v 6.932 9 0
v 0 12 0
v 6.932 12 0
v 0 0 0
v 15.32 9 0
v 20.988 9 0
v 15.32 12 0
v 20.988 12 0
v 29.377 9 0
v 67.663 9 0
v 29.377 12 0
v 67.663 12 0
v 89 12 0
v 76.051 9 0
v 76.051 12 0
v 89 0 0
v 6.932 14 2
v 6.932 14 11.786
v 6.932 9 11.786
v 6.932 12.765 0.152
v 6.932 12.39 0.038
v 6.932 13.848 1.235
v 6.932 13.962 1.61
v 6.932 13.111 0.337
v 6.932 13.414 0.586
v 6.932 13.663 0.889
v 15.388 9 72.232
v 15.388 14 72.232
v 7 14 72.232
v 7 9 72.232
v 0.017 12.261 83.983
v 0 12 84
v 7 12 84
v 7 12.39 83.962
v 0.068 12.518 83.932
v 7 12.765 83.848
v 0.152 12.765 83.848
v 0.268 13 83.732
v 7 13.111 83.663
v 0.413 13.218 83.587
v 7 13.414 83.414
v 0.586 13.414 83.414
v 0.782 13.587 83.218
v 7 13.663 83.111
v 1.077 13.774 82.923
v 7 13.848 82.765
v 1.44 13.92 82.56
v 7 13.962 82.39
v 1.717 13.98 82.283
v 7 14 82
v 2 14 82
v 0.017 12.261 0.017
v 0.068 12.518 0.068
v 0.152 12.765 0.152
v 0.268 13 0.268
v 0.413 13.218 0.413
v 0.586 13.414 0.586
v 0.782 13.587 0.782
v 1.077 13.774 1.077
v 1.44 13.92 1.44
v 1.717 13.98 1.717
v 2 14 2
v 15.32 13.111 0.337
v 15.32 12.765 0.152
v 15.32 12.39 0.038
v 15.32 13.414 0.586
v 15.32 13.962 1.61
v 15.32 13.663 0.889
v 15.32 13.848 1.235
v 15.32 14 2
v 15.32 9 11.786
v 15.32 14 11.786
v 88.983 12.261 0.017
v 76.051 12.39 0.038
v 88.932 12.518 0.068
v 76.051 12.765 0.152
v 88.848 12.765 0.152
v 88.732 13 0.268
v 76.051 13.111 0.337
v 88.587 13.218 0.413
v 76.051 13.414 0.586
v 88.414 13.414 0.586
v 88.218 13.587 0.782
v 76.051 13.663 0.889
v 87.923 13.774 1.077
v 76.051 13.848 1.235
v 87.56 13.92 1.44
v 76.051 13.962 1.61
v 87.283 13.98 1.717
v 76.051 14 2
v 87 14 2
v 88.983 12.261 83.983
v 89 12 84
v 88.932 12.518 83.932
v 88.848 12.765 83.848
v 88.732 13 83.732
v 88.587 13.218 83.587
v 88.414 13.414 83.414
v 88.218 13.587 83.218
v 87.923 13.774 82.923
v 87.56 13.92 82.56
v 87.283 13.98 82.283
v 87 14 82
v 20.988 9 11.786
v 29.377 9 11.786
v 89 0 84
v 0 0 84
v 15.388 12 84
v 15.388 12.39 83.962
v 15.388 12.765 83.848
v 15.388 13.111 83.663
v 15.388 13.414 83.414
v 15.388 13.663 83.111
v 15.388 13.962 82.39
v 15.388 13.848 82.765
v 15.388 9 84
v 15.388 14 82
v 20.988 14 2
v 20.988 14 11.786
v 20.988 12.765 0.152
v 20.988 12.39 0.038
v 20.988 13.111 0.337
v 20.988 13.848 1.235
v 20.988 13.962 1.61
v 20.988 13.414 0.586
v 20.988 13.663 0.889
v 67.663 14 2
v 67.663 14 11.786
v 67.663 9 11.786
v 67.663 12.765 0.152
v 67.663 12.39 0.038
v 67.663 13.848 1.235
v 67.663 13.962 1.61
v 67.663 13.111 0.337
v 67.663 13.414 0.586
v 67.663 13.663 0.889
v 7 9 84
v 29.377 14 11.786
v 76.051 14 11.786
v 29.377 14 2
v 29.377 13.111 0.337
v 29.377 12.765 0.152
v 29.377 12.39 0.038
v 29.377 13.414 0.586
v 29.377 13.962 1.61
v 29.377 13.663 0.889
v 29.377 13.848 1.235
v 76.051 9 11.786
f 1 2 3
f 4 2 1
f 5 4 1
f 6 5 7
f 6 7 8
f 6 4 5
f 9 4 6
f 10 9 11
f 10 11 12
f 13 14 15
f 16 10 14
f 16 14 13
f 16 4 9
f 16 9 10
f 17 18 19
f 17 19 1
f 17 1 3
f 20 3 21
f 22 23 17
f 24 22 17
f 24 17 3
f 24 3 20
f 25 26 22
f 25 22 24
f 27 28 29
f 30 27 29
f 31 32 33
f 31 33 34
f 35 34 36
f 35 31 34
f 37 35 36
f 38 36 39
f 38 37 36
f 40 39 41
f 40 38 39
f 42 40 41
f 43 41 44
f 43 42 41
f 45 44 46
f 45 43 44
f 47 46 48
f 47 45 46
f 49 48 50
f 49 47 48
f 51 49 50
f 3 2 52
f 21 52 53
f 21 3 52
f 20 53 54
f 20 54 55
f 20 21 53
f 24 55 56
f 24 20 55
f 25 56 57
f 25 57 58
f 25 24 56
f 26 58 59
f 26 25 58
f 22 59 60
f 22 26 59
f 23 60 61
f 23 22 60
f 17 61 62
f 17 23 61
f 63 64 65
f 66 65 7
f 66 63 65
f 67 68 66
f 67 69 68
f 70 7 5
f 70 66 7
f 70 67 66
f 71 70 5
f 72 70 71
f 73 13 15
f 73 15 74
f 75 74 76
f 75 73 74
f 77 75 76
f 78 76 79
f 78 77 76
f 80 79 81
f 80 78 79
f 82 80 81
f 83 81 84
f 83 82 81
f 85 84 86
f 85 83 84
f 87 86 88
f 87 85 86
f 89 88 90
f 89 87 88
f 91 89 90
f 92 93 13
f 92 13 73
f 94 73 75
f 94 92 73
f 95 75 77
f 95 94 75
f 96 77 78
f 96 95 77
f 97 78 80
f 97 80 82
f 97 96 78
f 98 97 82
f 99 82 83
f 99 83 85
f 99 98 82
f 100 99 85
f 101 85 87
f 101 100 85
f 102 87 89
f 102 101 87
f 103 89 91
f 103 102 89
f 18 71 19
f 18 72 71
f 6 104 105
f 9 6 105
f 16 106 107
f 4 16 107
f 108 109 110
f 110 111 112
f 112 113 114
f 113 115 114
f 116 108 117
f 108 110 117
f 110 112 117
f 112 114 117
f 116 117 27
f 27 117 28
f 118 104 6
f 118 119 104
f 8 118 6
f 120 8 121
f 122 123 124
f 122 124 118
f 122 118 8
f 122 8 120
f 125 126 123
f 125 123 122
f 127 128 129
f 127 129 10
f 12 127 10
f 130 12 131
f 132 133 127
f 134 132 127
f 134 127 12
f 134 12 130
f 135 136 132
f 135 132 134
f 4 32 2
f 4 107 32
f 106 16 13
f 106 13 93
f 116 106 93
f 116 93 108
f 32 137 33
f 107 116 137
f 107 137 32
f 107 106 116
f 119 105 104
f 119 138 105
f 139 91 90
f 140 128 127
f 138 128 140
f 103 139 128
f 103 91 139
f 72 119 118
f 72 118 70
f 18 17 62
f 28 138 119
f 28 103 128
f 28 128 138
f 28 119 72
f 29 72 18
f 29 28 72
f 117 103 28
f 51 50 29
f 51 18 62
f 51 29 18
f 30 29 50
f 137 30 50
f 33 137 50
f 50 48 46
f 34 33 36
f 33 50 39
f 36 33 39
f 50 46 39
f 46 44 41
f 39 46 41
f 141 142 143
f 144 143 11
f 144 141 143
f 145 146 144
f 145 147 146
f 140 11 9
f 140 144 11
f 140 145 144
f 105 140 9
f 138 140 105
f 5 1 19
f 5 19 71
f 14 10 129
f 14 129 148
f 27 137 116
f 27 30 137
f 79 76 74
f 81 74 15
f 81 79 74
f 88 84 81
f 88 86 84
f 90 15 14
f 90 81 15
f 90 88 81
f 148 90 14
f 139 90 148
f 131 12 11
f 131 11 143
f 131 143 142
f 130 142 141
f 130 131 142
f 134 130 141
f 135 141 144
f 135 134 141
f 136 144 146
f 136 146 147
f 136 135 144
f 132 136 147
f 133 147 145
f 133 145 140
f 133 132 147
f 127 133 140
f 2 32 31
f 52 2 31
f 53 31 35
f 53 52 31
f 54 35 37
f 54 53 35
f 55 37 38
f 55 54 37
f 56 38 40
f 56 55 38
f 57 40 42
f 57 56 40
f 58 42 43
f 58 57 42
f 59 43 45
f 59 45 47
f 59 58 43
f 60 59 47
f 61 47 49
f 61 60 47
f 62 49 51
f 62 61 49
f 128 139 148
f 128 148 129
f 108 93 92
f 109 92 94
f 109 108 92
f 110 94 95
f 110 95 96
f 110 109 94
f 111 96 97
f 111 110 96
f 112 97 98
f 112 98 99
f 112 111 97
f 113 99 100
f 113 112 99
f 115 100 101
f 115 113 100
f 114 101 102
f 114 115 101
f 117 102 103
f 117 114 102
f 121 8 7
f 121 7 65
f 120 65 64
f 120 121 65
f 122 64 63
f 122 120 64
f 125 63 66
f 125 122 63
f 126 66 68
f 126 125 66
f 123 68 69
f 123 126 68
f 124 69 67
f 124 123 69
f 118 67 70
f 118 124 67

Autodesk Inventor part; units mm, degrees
ref_plane "YZ Plane" through (0, 0, 0) normal (1, 0, 0) x (0, 1, 0)
ref_plane "XZ Plane" through (0, 0, 0) normal (0, 1, 0) x (-1, 0, 0)
ref_plane "XY Plane" through (0, 0, 0) normal (0, 0, 1) x (1, 0, 0)
sketch "Sketch1" plane through (0, 0, 0) normal (0, 1, 0) x (-1, 0, 0)
  line L0 (0, 0) -> (-89, 0)
  line L1 (-89, 0) -> (-89, 84)
  line L2 (-89, 84) -> (0, 84)
  line L3 (0, 84) -> (0, 0)
  dimension "d0" = 89
  dimension "d1" = 84
extrude "Extrusion1" add sketch "Sketch1" along normal blind 14
fillet "Fillet1" radius 2 4 edges at (44.5, 14, 0) (0, 14, 42) (89, 14, 42) (44.5, 14, 84)
sketch "Sketch2" plane through (0, 14, 0) normal (0, 1, 0) x (1, 0, 0)
  line L0 (89, 0) -> (0, 0) projected
  line L1 (6.9319, 0) -> (15.3203, 0)
  line L2 (15.3203, 0) -> (15.3203, -11.7863)
  line L3 (15.3203, -11.7863) -> (6.9319, -11.7863)
  line L4 (6.9319, -11.7863) -> (6.9319, 0)
  line L5 (20.9884, 0) -> (29.3768, 0)
  line L6 (29.3768, 0) -> (29.3768, -11.7863)
  line L7 (29.3768, -11.7863) -> (20.9884, -11.7863)
  line L8 (20.9884, -11.7863) -> (20.9884, 0)
  line L9 (67.6628, 0) -> (76.0512, 0)
  line L10 (76.0512, 0) -> (76.0512, -11.7863)
  line L11 (76.0512, -11.7863) -> (67.6628, -11.7863)
  line L12 (67.6628, -11.7863) -> (67.6628, 0)
  line L13 (7, -84.0181) -> (15.3884, -84.0181)
  line L14 (15.3884, -84.0181) -> (15.3884, -72.2317)
  line L15 (15.3884, -72.2317) -> (7, -72.2317)
  line L16 (7, -72.2317) -> (7, -84.0181)
  line L17 (89, -84) -> (0, -84) projected
extrude "Extrusion2" cut sketch "Sketch2" against normal blind 5
properties part number "RomeoSudoController"
